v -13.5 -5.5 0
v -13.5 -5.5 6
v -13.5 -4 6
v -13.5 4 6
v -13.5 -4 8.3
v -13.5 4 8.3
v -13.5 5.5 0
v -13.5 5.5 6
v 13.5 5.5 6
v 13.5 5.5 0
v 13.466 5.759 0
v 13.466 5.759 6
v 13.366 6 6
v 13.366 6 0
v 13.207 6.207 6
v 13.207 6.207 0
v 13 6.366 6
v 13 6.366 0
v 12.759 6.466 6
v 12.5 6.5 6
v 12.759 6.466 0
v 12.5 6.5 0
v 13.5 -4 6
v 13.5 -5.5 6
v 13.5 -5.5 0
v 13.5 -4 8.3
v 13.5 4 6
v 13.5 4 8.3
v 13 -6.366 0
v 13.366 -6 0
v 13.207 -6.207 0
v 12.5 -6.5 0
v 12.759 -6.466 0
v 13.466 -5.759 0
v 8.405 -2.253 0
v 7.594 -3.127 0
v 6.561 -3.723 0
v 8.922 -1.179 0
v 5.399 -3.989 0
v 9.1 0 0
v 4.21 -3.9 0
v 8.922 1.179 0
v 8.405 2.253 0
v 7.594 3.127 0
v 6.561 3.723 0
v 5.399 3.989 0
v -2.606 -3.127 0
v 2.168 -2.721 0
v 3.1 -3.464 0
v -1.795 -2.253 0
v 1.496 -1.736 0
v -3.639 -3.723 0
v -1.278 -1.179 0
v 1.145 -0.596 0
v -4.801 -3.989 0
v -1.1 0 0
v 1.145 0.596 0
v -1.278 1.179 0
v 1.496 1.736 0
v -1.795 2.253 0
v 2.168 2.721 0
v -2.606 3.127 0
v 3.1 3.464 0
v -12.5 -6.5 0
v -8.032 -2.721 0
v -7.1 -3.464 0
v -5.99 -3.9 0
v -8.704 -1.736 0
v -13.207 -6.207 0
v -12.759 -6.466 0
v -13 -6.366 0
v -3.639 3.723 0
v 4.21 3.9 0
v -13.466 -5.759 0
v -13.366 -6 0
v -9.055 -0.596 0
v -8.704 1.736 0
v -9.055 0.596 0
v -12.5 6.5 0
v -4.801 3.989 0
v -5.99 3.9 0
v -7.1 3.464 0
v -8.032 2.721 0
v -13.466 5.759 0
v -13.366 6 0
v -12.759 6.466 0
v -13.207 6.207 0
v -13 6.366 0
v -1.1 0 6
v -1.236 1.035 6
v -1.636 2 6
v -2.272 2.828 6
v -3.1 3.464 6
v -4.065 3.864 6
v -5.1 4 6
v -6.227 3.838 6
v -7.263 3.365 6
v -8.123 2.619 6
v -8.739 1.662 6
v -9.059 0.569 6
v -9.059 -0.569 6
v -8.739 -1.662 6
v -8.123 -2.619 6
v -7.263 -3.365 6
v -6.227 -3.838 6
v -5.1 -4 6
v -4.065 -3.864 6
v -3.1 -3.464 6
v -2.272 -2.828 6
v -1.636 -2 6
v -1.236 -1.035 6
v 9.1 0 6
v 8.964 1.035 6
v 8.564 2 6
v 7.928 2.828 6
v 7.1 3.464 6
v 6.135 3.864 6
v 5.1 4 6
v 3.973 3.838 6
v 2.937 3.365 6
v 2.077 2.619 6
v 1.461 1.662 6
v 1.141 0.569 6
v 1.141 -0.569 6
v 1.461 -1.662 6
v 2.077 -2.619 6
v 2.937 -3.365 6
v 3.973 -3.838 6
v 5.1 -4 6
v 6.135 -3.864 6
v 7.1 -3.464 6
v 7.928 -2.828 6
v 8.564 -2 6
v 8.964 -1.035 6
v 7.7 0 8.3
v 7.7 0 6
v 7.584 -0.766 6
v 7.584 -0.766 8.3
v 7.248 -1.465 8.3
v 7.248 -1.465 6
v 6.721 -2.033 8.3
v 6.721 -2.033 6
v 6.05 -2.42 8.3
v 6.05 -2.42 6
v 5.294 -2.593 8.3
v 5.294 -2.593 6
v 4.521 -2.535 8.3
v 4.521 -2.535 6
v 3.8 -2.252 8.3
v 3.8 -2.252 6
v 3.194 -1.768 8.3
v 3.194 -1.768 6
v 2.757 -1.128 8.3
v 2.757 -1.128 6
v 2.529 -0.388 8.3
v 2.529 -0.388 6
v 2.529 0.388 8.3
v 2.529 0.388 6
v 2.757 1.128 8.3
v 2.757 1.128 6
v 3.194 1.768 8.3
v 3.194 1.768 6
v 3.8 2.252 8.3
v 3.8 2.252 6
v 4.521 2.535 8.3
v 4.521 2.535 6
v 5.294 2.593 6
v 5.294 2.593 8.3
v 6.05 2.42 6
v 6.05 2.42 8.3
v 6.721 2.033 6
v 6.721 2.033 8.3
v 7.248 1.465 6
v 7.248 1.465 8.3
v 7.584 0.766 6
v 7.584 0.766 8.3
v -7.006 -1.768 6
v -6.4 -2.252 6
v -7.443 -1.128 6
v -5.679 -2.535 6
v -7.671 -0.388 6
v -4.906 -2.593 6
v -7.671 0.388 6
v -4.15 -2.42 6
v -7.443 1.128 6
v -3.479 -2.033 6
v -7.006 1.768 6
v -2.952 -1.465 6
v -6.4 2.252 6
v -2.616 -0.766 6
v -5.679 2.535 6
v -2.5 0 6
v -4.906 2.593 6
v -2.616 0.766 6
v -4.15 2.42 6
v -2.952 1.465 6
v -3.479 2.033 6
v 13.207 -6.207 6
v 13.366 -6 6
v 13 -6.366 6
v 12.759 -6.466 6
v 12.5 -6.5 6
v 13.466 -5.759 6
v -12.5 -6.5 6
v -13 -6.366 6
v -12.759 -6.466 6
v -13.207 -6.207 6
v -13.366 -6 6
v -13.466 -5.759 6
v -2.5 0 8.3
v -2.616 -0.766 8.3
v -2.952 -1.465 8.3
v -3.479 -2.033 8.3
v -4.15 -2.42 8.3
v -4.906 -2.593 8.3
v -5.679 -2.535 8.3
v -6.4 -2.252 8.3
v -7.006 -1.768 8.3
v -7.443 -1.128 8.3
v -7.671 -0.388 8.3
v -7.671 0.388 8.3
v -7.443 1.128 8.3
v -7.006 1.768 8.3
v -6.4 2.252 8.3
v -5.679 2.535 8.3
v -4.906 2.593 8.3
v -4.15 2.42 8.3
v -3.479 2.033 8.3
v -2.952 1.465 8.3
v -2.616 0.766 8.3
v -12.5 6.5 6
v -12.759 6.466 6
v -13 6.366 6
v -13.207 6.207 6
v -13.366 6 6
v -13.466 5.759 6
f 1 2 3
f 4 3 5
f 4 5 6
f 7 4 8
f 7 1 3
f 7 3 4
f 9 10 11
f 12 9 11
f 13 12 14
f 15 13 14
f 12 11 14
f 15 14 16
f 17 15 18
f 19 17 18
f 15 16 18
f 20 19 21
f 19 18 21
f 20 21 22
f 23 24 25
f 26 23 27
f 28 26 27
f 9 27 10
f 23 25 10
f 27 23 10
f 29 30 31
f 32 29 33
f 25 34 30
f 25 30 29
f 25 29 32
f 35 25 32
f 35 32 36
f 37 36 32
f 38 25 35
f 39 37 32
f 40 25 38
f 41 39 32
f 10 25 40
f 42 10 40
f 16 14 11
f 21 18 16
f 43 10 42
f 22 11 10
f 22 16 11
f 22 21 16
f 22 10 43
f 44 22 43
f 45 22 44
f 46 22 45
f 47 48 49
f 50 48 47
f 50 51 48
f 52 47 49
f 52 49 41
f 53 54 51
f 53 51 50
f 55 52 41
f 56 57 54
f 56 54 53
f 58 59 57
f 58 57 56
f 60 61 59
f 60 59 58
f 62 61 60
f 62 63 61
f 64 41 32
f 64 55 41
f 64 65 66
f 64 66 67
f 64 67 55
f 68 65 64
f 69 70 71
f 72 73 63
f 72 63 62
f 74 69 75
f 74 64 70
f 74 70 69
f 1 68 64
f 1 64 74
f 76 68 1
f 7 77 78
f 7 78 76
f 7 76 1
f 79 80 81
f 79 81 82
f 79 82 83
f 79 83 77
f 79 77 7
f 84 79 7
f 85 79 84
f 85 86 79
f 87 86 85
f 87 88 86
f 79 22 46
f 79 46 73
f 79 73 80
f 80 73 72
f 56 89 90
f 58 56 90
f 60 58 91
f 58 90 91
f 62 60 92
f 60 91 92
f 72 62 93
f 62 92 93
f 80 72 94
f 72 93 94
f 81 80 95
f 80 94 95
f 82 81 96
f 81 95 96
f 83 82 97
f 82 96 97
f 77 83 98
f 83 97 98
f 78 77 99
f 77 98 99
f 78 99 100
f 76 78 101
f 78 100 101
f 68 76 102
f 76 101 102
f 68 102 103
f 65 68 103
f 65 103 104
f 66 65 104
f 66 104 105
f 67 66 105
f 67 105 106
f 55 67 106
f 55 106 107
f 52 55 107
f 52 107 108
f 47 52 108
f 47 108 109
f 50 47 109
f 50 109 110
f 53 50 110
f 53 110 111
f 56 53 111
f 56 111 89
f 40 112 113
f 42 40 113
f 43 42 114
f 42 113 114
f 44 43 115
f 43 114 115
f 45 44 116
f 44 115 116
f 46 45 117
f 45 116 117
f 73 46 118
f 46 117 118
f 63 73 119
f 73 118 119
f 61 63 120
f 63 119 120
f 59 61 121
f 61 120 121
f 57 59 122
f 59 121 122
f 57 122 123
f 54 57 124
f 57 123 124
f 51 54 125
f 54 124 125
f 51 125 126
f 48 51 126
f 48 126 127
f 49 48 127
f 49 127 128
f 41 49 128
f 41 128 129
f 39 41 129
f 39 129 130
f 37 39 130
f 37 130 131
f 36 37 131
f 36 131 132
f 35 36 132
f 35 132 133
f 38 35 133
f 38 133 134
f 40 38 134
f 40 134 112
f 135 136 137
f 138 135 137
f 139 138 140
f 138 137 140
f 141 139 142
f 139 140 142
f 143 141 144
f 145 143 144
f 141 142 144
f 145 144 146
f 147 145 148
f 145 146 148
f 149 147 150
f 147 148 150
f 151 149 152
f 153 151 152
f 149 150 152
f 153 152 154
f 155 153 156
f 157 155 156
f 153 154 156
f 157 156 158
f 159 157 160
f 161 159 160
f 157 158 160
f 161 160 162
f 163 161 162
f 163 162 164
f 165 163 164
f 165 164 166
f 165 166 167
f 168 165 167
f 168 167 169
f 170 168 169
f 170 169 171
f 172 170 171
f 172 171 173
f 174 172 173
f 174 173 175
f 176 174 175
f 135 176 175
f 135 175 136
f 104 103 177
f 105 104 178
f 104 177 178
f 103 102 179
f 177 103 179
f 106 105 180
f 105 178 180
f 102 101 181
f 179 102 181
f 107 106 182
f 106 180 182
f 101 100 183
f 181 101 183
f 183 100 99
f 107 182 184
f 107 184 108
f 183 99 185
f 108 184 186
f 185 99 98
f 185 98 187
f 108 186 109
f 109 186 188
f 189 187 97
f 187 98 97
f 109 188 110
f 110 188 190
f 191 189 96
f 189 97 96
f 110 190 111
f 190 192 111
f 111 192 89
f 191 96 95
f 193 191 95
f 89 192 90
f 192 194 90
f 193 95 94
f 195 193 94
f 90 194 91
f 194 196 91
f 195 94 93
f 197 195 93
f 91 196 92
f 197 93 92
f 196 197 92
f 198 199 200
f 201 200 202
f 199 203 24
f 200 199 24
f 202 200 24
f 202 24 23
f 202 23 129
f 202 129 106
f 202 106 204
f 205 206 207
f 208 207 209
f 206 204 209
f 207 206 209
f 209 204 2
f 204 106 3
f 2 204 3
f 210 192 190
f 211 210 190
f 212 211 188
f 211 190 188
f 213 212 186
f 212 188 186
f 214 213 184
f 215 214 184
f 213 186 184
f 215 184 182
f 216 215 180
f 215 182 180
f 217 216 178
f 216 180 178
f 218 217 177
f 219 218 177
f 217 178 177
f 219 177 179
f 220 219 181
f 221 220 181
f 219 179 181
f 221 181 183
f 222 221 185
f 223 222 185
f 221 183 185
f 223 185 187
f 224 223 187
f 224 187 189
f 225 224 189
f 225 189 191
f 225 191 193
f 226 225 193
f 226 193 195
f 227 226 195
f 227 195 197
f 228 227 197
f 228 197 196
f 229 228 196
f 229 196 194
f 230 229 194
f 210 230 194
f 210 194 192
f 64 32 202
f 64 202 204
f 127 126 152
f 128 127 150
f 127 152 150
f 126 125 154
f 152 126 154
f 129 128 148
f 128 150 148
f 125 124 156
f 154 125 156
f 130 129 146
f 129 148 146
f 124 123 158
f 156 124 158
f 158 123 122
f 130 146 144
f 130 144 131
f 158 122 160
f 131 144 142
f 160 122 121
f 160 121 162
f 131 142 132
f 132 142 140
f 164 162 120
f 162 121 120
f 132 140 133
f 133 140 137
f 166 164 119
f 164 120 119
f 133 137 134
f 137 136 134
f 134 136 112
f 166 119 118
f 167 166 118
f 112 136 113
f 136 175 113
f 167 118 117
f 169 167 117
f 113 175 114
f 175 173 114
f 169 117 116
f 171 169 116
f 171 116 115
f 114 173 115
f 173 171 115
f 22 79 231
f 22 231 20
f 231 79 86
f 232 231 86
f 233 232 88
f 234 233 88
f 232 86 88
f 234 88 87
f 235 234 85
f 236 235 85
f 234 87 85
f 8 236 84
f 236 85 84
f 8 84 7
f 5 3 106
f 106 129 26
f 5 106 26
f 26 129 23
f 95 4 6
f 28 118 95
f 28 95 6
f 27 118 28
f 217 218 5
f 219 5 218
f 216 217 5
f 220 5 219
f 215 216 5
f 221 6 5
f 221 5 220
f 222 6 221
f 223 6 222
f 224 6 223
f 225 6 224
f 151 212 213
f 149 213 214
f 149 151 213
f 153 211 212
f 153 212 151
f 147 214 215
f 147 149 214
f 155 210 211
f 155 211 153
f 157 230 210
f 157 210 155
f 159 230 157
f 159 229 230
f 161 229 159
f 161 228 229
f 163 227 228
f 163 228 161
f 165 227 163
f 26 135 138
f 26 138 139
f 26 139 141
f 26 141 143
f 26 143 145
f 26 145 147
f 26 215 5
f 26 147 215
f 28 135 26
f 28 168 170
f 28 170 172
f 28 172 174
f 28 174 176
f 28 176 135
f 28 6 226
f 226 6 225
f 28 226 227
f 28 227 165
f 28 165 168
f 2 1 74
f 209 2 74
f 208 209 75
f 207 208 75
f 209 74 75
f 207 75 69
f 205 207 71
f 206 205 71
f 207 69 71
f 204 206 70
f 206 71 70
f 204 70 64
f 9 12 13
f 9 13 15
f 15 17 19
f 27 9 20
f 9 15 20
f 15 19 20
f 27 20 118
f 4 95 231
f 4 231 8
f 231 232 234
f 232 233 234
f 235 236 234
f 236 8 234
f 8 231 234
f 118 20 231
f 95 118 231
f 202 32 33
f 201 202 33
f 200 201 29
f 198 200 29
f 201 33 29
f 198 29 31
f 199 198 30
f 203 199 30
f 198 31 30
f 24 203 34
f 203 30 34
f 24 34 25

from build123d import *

# Parameters (mm, degrees)
PAD_DEPTH       = 6
SKETCH001_R     = 4
POCKET_DEPTH    = 6.001
SKETCH002_W     = 27
SKETCH002_H     = 8
PAD001_DEPTH    = 2.3
SKETCH003_R     = 2.6
POCKET001_DEPTH = 2.301


with BuildPart() as part:
    # Sketch → Pad (new body)
    with BuildSketch(Plane.XY):
        with BuildLine():
            Line((-12.5, 6.5), (12.5, 6.5))
            ThreePointArc((13.5, 5.5), (13.207107, 6.207107), (12.5, 6.5))
            Line((13.5, 5.5), (13.5, -5.5))
            ThreePointArc((12.5, -6.5), (13.207107, -6.207107), (13.5, -5.5))
            Line((12.5, -6.5), (-12.5, -6.5))
            ThreePointArc((-13.5, -5.5), (-13.207107, -6.207107), (-12.5, -6.5))
            Line((-13.5, -5.5), (-13.5, 5.5))
            ThreePointArc((-12.5, 6.5), (-13.207107, 6.207107), (-13.5, 5.5))
        make_face()
    extrude(amount=PAD_DEPTH)

    # Sketch001 (on Face10 of Pad) → Pocket (cut, through all)
    with BuildSketch(Plane.XY.offset(6)):
        with Locations((-5.1, 0)):
            Circle(SKETCH001_R)
        with Locations((5.1, 0)):
            Circle(SKETCH001_R)
    extrude(amount=-POCKET_DEPTH, mode=Mode.SUBTRACT)

    # Sketch002 (on Face5 of Pocket) → Pad001 (join)
    with BuildSketch(Plane.XY.offset(6)):
        Rectangle(SKETCH002_W, SKETCH002_H)
    extrude(amount=PAD001_DEPTH)

    # Sketch003 (on Face18 of Pad001) → Pocket001 (cut, through all)
    with BuildSketch(Plane(origin=(0, 0, 6), x_dir=(1, 0, 0), z_dir=(0, 0, -1))):
        with Locations((-5.1, 0)):
            Circle(SKETCH003_R)
        with Locations((5.1, 0)):
            Circle(SKETCH003_R)
    extrude(amount=-POCKET001_DEPTH, mode=Mode.SUBTRACT)


solid = part.part
